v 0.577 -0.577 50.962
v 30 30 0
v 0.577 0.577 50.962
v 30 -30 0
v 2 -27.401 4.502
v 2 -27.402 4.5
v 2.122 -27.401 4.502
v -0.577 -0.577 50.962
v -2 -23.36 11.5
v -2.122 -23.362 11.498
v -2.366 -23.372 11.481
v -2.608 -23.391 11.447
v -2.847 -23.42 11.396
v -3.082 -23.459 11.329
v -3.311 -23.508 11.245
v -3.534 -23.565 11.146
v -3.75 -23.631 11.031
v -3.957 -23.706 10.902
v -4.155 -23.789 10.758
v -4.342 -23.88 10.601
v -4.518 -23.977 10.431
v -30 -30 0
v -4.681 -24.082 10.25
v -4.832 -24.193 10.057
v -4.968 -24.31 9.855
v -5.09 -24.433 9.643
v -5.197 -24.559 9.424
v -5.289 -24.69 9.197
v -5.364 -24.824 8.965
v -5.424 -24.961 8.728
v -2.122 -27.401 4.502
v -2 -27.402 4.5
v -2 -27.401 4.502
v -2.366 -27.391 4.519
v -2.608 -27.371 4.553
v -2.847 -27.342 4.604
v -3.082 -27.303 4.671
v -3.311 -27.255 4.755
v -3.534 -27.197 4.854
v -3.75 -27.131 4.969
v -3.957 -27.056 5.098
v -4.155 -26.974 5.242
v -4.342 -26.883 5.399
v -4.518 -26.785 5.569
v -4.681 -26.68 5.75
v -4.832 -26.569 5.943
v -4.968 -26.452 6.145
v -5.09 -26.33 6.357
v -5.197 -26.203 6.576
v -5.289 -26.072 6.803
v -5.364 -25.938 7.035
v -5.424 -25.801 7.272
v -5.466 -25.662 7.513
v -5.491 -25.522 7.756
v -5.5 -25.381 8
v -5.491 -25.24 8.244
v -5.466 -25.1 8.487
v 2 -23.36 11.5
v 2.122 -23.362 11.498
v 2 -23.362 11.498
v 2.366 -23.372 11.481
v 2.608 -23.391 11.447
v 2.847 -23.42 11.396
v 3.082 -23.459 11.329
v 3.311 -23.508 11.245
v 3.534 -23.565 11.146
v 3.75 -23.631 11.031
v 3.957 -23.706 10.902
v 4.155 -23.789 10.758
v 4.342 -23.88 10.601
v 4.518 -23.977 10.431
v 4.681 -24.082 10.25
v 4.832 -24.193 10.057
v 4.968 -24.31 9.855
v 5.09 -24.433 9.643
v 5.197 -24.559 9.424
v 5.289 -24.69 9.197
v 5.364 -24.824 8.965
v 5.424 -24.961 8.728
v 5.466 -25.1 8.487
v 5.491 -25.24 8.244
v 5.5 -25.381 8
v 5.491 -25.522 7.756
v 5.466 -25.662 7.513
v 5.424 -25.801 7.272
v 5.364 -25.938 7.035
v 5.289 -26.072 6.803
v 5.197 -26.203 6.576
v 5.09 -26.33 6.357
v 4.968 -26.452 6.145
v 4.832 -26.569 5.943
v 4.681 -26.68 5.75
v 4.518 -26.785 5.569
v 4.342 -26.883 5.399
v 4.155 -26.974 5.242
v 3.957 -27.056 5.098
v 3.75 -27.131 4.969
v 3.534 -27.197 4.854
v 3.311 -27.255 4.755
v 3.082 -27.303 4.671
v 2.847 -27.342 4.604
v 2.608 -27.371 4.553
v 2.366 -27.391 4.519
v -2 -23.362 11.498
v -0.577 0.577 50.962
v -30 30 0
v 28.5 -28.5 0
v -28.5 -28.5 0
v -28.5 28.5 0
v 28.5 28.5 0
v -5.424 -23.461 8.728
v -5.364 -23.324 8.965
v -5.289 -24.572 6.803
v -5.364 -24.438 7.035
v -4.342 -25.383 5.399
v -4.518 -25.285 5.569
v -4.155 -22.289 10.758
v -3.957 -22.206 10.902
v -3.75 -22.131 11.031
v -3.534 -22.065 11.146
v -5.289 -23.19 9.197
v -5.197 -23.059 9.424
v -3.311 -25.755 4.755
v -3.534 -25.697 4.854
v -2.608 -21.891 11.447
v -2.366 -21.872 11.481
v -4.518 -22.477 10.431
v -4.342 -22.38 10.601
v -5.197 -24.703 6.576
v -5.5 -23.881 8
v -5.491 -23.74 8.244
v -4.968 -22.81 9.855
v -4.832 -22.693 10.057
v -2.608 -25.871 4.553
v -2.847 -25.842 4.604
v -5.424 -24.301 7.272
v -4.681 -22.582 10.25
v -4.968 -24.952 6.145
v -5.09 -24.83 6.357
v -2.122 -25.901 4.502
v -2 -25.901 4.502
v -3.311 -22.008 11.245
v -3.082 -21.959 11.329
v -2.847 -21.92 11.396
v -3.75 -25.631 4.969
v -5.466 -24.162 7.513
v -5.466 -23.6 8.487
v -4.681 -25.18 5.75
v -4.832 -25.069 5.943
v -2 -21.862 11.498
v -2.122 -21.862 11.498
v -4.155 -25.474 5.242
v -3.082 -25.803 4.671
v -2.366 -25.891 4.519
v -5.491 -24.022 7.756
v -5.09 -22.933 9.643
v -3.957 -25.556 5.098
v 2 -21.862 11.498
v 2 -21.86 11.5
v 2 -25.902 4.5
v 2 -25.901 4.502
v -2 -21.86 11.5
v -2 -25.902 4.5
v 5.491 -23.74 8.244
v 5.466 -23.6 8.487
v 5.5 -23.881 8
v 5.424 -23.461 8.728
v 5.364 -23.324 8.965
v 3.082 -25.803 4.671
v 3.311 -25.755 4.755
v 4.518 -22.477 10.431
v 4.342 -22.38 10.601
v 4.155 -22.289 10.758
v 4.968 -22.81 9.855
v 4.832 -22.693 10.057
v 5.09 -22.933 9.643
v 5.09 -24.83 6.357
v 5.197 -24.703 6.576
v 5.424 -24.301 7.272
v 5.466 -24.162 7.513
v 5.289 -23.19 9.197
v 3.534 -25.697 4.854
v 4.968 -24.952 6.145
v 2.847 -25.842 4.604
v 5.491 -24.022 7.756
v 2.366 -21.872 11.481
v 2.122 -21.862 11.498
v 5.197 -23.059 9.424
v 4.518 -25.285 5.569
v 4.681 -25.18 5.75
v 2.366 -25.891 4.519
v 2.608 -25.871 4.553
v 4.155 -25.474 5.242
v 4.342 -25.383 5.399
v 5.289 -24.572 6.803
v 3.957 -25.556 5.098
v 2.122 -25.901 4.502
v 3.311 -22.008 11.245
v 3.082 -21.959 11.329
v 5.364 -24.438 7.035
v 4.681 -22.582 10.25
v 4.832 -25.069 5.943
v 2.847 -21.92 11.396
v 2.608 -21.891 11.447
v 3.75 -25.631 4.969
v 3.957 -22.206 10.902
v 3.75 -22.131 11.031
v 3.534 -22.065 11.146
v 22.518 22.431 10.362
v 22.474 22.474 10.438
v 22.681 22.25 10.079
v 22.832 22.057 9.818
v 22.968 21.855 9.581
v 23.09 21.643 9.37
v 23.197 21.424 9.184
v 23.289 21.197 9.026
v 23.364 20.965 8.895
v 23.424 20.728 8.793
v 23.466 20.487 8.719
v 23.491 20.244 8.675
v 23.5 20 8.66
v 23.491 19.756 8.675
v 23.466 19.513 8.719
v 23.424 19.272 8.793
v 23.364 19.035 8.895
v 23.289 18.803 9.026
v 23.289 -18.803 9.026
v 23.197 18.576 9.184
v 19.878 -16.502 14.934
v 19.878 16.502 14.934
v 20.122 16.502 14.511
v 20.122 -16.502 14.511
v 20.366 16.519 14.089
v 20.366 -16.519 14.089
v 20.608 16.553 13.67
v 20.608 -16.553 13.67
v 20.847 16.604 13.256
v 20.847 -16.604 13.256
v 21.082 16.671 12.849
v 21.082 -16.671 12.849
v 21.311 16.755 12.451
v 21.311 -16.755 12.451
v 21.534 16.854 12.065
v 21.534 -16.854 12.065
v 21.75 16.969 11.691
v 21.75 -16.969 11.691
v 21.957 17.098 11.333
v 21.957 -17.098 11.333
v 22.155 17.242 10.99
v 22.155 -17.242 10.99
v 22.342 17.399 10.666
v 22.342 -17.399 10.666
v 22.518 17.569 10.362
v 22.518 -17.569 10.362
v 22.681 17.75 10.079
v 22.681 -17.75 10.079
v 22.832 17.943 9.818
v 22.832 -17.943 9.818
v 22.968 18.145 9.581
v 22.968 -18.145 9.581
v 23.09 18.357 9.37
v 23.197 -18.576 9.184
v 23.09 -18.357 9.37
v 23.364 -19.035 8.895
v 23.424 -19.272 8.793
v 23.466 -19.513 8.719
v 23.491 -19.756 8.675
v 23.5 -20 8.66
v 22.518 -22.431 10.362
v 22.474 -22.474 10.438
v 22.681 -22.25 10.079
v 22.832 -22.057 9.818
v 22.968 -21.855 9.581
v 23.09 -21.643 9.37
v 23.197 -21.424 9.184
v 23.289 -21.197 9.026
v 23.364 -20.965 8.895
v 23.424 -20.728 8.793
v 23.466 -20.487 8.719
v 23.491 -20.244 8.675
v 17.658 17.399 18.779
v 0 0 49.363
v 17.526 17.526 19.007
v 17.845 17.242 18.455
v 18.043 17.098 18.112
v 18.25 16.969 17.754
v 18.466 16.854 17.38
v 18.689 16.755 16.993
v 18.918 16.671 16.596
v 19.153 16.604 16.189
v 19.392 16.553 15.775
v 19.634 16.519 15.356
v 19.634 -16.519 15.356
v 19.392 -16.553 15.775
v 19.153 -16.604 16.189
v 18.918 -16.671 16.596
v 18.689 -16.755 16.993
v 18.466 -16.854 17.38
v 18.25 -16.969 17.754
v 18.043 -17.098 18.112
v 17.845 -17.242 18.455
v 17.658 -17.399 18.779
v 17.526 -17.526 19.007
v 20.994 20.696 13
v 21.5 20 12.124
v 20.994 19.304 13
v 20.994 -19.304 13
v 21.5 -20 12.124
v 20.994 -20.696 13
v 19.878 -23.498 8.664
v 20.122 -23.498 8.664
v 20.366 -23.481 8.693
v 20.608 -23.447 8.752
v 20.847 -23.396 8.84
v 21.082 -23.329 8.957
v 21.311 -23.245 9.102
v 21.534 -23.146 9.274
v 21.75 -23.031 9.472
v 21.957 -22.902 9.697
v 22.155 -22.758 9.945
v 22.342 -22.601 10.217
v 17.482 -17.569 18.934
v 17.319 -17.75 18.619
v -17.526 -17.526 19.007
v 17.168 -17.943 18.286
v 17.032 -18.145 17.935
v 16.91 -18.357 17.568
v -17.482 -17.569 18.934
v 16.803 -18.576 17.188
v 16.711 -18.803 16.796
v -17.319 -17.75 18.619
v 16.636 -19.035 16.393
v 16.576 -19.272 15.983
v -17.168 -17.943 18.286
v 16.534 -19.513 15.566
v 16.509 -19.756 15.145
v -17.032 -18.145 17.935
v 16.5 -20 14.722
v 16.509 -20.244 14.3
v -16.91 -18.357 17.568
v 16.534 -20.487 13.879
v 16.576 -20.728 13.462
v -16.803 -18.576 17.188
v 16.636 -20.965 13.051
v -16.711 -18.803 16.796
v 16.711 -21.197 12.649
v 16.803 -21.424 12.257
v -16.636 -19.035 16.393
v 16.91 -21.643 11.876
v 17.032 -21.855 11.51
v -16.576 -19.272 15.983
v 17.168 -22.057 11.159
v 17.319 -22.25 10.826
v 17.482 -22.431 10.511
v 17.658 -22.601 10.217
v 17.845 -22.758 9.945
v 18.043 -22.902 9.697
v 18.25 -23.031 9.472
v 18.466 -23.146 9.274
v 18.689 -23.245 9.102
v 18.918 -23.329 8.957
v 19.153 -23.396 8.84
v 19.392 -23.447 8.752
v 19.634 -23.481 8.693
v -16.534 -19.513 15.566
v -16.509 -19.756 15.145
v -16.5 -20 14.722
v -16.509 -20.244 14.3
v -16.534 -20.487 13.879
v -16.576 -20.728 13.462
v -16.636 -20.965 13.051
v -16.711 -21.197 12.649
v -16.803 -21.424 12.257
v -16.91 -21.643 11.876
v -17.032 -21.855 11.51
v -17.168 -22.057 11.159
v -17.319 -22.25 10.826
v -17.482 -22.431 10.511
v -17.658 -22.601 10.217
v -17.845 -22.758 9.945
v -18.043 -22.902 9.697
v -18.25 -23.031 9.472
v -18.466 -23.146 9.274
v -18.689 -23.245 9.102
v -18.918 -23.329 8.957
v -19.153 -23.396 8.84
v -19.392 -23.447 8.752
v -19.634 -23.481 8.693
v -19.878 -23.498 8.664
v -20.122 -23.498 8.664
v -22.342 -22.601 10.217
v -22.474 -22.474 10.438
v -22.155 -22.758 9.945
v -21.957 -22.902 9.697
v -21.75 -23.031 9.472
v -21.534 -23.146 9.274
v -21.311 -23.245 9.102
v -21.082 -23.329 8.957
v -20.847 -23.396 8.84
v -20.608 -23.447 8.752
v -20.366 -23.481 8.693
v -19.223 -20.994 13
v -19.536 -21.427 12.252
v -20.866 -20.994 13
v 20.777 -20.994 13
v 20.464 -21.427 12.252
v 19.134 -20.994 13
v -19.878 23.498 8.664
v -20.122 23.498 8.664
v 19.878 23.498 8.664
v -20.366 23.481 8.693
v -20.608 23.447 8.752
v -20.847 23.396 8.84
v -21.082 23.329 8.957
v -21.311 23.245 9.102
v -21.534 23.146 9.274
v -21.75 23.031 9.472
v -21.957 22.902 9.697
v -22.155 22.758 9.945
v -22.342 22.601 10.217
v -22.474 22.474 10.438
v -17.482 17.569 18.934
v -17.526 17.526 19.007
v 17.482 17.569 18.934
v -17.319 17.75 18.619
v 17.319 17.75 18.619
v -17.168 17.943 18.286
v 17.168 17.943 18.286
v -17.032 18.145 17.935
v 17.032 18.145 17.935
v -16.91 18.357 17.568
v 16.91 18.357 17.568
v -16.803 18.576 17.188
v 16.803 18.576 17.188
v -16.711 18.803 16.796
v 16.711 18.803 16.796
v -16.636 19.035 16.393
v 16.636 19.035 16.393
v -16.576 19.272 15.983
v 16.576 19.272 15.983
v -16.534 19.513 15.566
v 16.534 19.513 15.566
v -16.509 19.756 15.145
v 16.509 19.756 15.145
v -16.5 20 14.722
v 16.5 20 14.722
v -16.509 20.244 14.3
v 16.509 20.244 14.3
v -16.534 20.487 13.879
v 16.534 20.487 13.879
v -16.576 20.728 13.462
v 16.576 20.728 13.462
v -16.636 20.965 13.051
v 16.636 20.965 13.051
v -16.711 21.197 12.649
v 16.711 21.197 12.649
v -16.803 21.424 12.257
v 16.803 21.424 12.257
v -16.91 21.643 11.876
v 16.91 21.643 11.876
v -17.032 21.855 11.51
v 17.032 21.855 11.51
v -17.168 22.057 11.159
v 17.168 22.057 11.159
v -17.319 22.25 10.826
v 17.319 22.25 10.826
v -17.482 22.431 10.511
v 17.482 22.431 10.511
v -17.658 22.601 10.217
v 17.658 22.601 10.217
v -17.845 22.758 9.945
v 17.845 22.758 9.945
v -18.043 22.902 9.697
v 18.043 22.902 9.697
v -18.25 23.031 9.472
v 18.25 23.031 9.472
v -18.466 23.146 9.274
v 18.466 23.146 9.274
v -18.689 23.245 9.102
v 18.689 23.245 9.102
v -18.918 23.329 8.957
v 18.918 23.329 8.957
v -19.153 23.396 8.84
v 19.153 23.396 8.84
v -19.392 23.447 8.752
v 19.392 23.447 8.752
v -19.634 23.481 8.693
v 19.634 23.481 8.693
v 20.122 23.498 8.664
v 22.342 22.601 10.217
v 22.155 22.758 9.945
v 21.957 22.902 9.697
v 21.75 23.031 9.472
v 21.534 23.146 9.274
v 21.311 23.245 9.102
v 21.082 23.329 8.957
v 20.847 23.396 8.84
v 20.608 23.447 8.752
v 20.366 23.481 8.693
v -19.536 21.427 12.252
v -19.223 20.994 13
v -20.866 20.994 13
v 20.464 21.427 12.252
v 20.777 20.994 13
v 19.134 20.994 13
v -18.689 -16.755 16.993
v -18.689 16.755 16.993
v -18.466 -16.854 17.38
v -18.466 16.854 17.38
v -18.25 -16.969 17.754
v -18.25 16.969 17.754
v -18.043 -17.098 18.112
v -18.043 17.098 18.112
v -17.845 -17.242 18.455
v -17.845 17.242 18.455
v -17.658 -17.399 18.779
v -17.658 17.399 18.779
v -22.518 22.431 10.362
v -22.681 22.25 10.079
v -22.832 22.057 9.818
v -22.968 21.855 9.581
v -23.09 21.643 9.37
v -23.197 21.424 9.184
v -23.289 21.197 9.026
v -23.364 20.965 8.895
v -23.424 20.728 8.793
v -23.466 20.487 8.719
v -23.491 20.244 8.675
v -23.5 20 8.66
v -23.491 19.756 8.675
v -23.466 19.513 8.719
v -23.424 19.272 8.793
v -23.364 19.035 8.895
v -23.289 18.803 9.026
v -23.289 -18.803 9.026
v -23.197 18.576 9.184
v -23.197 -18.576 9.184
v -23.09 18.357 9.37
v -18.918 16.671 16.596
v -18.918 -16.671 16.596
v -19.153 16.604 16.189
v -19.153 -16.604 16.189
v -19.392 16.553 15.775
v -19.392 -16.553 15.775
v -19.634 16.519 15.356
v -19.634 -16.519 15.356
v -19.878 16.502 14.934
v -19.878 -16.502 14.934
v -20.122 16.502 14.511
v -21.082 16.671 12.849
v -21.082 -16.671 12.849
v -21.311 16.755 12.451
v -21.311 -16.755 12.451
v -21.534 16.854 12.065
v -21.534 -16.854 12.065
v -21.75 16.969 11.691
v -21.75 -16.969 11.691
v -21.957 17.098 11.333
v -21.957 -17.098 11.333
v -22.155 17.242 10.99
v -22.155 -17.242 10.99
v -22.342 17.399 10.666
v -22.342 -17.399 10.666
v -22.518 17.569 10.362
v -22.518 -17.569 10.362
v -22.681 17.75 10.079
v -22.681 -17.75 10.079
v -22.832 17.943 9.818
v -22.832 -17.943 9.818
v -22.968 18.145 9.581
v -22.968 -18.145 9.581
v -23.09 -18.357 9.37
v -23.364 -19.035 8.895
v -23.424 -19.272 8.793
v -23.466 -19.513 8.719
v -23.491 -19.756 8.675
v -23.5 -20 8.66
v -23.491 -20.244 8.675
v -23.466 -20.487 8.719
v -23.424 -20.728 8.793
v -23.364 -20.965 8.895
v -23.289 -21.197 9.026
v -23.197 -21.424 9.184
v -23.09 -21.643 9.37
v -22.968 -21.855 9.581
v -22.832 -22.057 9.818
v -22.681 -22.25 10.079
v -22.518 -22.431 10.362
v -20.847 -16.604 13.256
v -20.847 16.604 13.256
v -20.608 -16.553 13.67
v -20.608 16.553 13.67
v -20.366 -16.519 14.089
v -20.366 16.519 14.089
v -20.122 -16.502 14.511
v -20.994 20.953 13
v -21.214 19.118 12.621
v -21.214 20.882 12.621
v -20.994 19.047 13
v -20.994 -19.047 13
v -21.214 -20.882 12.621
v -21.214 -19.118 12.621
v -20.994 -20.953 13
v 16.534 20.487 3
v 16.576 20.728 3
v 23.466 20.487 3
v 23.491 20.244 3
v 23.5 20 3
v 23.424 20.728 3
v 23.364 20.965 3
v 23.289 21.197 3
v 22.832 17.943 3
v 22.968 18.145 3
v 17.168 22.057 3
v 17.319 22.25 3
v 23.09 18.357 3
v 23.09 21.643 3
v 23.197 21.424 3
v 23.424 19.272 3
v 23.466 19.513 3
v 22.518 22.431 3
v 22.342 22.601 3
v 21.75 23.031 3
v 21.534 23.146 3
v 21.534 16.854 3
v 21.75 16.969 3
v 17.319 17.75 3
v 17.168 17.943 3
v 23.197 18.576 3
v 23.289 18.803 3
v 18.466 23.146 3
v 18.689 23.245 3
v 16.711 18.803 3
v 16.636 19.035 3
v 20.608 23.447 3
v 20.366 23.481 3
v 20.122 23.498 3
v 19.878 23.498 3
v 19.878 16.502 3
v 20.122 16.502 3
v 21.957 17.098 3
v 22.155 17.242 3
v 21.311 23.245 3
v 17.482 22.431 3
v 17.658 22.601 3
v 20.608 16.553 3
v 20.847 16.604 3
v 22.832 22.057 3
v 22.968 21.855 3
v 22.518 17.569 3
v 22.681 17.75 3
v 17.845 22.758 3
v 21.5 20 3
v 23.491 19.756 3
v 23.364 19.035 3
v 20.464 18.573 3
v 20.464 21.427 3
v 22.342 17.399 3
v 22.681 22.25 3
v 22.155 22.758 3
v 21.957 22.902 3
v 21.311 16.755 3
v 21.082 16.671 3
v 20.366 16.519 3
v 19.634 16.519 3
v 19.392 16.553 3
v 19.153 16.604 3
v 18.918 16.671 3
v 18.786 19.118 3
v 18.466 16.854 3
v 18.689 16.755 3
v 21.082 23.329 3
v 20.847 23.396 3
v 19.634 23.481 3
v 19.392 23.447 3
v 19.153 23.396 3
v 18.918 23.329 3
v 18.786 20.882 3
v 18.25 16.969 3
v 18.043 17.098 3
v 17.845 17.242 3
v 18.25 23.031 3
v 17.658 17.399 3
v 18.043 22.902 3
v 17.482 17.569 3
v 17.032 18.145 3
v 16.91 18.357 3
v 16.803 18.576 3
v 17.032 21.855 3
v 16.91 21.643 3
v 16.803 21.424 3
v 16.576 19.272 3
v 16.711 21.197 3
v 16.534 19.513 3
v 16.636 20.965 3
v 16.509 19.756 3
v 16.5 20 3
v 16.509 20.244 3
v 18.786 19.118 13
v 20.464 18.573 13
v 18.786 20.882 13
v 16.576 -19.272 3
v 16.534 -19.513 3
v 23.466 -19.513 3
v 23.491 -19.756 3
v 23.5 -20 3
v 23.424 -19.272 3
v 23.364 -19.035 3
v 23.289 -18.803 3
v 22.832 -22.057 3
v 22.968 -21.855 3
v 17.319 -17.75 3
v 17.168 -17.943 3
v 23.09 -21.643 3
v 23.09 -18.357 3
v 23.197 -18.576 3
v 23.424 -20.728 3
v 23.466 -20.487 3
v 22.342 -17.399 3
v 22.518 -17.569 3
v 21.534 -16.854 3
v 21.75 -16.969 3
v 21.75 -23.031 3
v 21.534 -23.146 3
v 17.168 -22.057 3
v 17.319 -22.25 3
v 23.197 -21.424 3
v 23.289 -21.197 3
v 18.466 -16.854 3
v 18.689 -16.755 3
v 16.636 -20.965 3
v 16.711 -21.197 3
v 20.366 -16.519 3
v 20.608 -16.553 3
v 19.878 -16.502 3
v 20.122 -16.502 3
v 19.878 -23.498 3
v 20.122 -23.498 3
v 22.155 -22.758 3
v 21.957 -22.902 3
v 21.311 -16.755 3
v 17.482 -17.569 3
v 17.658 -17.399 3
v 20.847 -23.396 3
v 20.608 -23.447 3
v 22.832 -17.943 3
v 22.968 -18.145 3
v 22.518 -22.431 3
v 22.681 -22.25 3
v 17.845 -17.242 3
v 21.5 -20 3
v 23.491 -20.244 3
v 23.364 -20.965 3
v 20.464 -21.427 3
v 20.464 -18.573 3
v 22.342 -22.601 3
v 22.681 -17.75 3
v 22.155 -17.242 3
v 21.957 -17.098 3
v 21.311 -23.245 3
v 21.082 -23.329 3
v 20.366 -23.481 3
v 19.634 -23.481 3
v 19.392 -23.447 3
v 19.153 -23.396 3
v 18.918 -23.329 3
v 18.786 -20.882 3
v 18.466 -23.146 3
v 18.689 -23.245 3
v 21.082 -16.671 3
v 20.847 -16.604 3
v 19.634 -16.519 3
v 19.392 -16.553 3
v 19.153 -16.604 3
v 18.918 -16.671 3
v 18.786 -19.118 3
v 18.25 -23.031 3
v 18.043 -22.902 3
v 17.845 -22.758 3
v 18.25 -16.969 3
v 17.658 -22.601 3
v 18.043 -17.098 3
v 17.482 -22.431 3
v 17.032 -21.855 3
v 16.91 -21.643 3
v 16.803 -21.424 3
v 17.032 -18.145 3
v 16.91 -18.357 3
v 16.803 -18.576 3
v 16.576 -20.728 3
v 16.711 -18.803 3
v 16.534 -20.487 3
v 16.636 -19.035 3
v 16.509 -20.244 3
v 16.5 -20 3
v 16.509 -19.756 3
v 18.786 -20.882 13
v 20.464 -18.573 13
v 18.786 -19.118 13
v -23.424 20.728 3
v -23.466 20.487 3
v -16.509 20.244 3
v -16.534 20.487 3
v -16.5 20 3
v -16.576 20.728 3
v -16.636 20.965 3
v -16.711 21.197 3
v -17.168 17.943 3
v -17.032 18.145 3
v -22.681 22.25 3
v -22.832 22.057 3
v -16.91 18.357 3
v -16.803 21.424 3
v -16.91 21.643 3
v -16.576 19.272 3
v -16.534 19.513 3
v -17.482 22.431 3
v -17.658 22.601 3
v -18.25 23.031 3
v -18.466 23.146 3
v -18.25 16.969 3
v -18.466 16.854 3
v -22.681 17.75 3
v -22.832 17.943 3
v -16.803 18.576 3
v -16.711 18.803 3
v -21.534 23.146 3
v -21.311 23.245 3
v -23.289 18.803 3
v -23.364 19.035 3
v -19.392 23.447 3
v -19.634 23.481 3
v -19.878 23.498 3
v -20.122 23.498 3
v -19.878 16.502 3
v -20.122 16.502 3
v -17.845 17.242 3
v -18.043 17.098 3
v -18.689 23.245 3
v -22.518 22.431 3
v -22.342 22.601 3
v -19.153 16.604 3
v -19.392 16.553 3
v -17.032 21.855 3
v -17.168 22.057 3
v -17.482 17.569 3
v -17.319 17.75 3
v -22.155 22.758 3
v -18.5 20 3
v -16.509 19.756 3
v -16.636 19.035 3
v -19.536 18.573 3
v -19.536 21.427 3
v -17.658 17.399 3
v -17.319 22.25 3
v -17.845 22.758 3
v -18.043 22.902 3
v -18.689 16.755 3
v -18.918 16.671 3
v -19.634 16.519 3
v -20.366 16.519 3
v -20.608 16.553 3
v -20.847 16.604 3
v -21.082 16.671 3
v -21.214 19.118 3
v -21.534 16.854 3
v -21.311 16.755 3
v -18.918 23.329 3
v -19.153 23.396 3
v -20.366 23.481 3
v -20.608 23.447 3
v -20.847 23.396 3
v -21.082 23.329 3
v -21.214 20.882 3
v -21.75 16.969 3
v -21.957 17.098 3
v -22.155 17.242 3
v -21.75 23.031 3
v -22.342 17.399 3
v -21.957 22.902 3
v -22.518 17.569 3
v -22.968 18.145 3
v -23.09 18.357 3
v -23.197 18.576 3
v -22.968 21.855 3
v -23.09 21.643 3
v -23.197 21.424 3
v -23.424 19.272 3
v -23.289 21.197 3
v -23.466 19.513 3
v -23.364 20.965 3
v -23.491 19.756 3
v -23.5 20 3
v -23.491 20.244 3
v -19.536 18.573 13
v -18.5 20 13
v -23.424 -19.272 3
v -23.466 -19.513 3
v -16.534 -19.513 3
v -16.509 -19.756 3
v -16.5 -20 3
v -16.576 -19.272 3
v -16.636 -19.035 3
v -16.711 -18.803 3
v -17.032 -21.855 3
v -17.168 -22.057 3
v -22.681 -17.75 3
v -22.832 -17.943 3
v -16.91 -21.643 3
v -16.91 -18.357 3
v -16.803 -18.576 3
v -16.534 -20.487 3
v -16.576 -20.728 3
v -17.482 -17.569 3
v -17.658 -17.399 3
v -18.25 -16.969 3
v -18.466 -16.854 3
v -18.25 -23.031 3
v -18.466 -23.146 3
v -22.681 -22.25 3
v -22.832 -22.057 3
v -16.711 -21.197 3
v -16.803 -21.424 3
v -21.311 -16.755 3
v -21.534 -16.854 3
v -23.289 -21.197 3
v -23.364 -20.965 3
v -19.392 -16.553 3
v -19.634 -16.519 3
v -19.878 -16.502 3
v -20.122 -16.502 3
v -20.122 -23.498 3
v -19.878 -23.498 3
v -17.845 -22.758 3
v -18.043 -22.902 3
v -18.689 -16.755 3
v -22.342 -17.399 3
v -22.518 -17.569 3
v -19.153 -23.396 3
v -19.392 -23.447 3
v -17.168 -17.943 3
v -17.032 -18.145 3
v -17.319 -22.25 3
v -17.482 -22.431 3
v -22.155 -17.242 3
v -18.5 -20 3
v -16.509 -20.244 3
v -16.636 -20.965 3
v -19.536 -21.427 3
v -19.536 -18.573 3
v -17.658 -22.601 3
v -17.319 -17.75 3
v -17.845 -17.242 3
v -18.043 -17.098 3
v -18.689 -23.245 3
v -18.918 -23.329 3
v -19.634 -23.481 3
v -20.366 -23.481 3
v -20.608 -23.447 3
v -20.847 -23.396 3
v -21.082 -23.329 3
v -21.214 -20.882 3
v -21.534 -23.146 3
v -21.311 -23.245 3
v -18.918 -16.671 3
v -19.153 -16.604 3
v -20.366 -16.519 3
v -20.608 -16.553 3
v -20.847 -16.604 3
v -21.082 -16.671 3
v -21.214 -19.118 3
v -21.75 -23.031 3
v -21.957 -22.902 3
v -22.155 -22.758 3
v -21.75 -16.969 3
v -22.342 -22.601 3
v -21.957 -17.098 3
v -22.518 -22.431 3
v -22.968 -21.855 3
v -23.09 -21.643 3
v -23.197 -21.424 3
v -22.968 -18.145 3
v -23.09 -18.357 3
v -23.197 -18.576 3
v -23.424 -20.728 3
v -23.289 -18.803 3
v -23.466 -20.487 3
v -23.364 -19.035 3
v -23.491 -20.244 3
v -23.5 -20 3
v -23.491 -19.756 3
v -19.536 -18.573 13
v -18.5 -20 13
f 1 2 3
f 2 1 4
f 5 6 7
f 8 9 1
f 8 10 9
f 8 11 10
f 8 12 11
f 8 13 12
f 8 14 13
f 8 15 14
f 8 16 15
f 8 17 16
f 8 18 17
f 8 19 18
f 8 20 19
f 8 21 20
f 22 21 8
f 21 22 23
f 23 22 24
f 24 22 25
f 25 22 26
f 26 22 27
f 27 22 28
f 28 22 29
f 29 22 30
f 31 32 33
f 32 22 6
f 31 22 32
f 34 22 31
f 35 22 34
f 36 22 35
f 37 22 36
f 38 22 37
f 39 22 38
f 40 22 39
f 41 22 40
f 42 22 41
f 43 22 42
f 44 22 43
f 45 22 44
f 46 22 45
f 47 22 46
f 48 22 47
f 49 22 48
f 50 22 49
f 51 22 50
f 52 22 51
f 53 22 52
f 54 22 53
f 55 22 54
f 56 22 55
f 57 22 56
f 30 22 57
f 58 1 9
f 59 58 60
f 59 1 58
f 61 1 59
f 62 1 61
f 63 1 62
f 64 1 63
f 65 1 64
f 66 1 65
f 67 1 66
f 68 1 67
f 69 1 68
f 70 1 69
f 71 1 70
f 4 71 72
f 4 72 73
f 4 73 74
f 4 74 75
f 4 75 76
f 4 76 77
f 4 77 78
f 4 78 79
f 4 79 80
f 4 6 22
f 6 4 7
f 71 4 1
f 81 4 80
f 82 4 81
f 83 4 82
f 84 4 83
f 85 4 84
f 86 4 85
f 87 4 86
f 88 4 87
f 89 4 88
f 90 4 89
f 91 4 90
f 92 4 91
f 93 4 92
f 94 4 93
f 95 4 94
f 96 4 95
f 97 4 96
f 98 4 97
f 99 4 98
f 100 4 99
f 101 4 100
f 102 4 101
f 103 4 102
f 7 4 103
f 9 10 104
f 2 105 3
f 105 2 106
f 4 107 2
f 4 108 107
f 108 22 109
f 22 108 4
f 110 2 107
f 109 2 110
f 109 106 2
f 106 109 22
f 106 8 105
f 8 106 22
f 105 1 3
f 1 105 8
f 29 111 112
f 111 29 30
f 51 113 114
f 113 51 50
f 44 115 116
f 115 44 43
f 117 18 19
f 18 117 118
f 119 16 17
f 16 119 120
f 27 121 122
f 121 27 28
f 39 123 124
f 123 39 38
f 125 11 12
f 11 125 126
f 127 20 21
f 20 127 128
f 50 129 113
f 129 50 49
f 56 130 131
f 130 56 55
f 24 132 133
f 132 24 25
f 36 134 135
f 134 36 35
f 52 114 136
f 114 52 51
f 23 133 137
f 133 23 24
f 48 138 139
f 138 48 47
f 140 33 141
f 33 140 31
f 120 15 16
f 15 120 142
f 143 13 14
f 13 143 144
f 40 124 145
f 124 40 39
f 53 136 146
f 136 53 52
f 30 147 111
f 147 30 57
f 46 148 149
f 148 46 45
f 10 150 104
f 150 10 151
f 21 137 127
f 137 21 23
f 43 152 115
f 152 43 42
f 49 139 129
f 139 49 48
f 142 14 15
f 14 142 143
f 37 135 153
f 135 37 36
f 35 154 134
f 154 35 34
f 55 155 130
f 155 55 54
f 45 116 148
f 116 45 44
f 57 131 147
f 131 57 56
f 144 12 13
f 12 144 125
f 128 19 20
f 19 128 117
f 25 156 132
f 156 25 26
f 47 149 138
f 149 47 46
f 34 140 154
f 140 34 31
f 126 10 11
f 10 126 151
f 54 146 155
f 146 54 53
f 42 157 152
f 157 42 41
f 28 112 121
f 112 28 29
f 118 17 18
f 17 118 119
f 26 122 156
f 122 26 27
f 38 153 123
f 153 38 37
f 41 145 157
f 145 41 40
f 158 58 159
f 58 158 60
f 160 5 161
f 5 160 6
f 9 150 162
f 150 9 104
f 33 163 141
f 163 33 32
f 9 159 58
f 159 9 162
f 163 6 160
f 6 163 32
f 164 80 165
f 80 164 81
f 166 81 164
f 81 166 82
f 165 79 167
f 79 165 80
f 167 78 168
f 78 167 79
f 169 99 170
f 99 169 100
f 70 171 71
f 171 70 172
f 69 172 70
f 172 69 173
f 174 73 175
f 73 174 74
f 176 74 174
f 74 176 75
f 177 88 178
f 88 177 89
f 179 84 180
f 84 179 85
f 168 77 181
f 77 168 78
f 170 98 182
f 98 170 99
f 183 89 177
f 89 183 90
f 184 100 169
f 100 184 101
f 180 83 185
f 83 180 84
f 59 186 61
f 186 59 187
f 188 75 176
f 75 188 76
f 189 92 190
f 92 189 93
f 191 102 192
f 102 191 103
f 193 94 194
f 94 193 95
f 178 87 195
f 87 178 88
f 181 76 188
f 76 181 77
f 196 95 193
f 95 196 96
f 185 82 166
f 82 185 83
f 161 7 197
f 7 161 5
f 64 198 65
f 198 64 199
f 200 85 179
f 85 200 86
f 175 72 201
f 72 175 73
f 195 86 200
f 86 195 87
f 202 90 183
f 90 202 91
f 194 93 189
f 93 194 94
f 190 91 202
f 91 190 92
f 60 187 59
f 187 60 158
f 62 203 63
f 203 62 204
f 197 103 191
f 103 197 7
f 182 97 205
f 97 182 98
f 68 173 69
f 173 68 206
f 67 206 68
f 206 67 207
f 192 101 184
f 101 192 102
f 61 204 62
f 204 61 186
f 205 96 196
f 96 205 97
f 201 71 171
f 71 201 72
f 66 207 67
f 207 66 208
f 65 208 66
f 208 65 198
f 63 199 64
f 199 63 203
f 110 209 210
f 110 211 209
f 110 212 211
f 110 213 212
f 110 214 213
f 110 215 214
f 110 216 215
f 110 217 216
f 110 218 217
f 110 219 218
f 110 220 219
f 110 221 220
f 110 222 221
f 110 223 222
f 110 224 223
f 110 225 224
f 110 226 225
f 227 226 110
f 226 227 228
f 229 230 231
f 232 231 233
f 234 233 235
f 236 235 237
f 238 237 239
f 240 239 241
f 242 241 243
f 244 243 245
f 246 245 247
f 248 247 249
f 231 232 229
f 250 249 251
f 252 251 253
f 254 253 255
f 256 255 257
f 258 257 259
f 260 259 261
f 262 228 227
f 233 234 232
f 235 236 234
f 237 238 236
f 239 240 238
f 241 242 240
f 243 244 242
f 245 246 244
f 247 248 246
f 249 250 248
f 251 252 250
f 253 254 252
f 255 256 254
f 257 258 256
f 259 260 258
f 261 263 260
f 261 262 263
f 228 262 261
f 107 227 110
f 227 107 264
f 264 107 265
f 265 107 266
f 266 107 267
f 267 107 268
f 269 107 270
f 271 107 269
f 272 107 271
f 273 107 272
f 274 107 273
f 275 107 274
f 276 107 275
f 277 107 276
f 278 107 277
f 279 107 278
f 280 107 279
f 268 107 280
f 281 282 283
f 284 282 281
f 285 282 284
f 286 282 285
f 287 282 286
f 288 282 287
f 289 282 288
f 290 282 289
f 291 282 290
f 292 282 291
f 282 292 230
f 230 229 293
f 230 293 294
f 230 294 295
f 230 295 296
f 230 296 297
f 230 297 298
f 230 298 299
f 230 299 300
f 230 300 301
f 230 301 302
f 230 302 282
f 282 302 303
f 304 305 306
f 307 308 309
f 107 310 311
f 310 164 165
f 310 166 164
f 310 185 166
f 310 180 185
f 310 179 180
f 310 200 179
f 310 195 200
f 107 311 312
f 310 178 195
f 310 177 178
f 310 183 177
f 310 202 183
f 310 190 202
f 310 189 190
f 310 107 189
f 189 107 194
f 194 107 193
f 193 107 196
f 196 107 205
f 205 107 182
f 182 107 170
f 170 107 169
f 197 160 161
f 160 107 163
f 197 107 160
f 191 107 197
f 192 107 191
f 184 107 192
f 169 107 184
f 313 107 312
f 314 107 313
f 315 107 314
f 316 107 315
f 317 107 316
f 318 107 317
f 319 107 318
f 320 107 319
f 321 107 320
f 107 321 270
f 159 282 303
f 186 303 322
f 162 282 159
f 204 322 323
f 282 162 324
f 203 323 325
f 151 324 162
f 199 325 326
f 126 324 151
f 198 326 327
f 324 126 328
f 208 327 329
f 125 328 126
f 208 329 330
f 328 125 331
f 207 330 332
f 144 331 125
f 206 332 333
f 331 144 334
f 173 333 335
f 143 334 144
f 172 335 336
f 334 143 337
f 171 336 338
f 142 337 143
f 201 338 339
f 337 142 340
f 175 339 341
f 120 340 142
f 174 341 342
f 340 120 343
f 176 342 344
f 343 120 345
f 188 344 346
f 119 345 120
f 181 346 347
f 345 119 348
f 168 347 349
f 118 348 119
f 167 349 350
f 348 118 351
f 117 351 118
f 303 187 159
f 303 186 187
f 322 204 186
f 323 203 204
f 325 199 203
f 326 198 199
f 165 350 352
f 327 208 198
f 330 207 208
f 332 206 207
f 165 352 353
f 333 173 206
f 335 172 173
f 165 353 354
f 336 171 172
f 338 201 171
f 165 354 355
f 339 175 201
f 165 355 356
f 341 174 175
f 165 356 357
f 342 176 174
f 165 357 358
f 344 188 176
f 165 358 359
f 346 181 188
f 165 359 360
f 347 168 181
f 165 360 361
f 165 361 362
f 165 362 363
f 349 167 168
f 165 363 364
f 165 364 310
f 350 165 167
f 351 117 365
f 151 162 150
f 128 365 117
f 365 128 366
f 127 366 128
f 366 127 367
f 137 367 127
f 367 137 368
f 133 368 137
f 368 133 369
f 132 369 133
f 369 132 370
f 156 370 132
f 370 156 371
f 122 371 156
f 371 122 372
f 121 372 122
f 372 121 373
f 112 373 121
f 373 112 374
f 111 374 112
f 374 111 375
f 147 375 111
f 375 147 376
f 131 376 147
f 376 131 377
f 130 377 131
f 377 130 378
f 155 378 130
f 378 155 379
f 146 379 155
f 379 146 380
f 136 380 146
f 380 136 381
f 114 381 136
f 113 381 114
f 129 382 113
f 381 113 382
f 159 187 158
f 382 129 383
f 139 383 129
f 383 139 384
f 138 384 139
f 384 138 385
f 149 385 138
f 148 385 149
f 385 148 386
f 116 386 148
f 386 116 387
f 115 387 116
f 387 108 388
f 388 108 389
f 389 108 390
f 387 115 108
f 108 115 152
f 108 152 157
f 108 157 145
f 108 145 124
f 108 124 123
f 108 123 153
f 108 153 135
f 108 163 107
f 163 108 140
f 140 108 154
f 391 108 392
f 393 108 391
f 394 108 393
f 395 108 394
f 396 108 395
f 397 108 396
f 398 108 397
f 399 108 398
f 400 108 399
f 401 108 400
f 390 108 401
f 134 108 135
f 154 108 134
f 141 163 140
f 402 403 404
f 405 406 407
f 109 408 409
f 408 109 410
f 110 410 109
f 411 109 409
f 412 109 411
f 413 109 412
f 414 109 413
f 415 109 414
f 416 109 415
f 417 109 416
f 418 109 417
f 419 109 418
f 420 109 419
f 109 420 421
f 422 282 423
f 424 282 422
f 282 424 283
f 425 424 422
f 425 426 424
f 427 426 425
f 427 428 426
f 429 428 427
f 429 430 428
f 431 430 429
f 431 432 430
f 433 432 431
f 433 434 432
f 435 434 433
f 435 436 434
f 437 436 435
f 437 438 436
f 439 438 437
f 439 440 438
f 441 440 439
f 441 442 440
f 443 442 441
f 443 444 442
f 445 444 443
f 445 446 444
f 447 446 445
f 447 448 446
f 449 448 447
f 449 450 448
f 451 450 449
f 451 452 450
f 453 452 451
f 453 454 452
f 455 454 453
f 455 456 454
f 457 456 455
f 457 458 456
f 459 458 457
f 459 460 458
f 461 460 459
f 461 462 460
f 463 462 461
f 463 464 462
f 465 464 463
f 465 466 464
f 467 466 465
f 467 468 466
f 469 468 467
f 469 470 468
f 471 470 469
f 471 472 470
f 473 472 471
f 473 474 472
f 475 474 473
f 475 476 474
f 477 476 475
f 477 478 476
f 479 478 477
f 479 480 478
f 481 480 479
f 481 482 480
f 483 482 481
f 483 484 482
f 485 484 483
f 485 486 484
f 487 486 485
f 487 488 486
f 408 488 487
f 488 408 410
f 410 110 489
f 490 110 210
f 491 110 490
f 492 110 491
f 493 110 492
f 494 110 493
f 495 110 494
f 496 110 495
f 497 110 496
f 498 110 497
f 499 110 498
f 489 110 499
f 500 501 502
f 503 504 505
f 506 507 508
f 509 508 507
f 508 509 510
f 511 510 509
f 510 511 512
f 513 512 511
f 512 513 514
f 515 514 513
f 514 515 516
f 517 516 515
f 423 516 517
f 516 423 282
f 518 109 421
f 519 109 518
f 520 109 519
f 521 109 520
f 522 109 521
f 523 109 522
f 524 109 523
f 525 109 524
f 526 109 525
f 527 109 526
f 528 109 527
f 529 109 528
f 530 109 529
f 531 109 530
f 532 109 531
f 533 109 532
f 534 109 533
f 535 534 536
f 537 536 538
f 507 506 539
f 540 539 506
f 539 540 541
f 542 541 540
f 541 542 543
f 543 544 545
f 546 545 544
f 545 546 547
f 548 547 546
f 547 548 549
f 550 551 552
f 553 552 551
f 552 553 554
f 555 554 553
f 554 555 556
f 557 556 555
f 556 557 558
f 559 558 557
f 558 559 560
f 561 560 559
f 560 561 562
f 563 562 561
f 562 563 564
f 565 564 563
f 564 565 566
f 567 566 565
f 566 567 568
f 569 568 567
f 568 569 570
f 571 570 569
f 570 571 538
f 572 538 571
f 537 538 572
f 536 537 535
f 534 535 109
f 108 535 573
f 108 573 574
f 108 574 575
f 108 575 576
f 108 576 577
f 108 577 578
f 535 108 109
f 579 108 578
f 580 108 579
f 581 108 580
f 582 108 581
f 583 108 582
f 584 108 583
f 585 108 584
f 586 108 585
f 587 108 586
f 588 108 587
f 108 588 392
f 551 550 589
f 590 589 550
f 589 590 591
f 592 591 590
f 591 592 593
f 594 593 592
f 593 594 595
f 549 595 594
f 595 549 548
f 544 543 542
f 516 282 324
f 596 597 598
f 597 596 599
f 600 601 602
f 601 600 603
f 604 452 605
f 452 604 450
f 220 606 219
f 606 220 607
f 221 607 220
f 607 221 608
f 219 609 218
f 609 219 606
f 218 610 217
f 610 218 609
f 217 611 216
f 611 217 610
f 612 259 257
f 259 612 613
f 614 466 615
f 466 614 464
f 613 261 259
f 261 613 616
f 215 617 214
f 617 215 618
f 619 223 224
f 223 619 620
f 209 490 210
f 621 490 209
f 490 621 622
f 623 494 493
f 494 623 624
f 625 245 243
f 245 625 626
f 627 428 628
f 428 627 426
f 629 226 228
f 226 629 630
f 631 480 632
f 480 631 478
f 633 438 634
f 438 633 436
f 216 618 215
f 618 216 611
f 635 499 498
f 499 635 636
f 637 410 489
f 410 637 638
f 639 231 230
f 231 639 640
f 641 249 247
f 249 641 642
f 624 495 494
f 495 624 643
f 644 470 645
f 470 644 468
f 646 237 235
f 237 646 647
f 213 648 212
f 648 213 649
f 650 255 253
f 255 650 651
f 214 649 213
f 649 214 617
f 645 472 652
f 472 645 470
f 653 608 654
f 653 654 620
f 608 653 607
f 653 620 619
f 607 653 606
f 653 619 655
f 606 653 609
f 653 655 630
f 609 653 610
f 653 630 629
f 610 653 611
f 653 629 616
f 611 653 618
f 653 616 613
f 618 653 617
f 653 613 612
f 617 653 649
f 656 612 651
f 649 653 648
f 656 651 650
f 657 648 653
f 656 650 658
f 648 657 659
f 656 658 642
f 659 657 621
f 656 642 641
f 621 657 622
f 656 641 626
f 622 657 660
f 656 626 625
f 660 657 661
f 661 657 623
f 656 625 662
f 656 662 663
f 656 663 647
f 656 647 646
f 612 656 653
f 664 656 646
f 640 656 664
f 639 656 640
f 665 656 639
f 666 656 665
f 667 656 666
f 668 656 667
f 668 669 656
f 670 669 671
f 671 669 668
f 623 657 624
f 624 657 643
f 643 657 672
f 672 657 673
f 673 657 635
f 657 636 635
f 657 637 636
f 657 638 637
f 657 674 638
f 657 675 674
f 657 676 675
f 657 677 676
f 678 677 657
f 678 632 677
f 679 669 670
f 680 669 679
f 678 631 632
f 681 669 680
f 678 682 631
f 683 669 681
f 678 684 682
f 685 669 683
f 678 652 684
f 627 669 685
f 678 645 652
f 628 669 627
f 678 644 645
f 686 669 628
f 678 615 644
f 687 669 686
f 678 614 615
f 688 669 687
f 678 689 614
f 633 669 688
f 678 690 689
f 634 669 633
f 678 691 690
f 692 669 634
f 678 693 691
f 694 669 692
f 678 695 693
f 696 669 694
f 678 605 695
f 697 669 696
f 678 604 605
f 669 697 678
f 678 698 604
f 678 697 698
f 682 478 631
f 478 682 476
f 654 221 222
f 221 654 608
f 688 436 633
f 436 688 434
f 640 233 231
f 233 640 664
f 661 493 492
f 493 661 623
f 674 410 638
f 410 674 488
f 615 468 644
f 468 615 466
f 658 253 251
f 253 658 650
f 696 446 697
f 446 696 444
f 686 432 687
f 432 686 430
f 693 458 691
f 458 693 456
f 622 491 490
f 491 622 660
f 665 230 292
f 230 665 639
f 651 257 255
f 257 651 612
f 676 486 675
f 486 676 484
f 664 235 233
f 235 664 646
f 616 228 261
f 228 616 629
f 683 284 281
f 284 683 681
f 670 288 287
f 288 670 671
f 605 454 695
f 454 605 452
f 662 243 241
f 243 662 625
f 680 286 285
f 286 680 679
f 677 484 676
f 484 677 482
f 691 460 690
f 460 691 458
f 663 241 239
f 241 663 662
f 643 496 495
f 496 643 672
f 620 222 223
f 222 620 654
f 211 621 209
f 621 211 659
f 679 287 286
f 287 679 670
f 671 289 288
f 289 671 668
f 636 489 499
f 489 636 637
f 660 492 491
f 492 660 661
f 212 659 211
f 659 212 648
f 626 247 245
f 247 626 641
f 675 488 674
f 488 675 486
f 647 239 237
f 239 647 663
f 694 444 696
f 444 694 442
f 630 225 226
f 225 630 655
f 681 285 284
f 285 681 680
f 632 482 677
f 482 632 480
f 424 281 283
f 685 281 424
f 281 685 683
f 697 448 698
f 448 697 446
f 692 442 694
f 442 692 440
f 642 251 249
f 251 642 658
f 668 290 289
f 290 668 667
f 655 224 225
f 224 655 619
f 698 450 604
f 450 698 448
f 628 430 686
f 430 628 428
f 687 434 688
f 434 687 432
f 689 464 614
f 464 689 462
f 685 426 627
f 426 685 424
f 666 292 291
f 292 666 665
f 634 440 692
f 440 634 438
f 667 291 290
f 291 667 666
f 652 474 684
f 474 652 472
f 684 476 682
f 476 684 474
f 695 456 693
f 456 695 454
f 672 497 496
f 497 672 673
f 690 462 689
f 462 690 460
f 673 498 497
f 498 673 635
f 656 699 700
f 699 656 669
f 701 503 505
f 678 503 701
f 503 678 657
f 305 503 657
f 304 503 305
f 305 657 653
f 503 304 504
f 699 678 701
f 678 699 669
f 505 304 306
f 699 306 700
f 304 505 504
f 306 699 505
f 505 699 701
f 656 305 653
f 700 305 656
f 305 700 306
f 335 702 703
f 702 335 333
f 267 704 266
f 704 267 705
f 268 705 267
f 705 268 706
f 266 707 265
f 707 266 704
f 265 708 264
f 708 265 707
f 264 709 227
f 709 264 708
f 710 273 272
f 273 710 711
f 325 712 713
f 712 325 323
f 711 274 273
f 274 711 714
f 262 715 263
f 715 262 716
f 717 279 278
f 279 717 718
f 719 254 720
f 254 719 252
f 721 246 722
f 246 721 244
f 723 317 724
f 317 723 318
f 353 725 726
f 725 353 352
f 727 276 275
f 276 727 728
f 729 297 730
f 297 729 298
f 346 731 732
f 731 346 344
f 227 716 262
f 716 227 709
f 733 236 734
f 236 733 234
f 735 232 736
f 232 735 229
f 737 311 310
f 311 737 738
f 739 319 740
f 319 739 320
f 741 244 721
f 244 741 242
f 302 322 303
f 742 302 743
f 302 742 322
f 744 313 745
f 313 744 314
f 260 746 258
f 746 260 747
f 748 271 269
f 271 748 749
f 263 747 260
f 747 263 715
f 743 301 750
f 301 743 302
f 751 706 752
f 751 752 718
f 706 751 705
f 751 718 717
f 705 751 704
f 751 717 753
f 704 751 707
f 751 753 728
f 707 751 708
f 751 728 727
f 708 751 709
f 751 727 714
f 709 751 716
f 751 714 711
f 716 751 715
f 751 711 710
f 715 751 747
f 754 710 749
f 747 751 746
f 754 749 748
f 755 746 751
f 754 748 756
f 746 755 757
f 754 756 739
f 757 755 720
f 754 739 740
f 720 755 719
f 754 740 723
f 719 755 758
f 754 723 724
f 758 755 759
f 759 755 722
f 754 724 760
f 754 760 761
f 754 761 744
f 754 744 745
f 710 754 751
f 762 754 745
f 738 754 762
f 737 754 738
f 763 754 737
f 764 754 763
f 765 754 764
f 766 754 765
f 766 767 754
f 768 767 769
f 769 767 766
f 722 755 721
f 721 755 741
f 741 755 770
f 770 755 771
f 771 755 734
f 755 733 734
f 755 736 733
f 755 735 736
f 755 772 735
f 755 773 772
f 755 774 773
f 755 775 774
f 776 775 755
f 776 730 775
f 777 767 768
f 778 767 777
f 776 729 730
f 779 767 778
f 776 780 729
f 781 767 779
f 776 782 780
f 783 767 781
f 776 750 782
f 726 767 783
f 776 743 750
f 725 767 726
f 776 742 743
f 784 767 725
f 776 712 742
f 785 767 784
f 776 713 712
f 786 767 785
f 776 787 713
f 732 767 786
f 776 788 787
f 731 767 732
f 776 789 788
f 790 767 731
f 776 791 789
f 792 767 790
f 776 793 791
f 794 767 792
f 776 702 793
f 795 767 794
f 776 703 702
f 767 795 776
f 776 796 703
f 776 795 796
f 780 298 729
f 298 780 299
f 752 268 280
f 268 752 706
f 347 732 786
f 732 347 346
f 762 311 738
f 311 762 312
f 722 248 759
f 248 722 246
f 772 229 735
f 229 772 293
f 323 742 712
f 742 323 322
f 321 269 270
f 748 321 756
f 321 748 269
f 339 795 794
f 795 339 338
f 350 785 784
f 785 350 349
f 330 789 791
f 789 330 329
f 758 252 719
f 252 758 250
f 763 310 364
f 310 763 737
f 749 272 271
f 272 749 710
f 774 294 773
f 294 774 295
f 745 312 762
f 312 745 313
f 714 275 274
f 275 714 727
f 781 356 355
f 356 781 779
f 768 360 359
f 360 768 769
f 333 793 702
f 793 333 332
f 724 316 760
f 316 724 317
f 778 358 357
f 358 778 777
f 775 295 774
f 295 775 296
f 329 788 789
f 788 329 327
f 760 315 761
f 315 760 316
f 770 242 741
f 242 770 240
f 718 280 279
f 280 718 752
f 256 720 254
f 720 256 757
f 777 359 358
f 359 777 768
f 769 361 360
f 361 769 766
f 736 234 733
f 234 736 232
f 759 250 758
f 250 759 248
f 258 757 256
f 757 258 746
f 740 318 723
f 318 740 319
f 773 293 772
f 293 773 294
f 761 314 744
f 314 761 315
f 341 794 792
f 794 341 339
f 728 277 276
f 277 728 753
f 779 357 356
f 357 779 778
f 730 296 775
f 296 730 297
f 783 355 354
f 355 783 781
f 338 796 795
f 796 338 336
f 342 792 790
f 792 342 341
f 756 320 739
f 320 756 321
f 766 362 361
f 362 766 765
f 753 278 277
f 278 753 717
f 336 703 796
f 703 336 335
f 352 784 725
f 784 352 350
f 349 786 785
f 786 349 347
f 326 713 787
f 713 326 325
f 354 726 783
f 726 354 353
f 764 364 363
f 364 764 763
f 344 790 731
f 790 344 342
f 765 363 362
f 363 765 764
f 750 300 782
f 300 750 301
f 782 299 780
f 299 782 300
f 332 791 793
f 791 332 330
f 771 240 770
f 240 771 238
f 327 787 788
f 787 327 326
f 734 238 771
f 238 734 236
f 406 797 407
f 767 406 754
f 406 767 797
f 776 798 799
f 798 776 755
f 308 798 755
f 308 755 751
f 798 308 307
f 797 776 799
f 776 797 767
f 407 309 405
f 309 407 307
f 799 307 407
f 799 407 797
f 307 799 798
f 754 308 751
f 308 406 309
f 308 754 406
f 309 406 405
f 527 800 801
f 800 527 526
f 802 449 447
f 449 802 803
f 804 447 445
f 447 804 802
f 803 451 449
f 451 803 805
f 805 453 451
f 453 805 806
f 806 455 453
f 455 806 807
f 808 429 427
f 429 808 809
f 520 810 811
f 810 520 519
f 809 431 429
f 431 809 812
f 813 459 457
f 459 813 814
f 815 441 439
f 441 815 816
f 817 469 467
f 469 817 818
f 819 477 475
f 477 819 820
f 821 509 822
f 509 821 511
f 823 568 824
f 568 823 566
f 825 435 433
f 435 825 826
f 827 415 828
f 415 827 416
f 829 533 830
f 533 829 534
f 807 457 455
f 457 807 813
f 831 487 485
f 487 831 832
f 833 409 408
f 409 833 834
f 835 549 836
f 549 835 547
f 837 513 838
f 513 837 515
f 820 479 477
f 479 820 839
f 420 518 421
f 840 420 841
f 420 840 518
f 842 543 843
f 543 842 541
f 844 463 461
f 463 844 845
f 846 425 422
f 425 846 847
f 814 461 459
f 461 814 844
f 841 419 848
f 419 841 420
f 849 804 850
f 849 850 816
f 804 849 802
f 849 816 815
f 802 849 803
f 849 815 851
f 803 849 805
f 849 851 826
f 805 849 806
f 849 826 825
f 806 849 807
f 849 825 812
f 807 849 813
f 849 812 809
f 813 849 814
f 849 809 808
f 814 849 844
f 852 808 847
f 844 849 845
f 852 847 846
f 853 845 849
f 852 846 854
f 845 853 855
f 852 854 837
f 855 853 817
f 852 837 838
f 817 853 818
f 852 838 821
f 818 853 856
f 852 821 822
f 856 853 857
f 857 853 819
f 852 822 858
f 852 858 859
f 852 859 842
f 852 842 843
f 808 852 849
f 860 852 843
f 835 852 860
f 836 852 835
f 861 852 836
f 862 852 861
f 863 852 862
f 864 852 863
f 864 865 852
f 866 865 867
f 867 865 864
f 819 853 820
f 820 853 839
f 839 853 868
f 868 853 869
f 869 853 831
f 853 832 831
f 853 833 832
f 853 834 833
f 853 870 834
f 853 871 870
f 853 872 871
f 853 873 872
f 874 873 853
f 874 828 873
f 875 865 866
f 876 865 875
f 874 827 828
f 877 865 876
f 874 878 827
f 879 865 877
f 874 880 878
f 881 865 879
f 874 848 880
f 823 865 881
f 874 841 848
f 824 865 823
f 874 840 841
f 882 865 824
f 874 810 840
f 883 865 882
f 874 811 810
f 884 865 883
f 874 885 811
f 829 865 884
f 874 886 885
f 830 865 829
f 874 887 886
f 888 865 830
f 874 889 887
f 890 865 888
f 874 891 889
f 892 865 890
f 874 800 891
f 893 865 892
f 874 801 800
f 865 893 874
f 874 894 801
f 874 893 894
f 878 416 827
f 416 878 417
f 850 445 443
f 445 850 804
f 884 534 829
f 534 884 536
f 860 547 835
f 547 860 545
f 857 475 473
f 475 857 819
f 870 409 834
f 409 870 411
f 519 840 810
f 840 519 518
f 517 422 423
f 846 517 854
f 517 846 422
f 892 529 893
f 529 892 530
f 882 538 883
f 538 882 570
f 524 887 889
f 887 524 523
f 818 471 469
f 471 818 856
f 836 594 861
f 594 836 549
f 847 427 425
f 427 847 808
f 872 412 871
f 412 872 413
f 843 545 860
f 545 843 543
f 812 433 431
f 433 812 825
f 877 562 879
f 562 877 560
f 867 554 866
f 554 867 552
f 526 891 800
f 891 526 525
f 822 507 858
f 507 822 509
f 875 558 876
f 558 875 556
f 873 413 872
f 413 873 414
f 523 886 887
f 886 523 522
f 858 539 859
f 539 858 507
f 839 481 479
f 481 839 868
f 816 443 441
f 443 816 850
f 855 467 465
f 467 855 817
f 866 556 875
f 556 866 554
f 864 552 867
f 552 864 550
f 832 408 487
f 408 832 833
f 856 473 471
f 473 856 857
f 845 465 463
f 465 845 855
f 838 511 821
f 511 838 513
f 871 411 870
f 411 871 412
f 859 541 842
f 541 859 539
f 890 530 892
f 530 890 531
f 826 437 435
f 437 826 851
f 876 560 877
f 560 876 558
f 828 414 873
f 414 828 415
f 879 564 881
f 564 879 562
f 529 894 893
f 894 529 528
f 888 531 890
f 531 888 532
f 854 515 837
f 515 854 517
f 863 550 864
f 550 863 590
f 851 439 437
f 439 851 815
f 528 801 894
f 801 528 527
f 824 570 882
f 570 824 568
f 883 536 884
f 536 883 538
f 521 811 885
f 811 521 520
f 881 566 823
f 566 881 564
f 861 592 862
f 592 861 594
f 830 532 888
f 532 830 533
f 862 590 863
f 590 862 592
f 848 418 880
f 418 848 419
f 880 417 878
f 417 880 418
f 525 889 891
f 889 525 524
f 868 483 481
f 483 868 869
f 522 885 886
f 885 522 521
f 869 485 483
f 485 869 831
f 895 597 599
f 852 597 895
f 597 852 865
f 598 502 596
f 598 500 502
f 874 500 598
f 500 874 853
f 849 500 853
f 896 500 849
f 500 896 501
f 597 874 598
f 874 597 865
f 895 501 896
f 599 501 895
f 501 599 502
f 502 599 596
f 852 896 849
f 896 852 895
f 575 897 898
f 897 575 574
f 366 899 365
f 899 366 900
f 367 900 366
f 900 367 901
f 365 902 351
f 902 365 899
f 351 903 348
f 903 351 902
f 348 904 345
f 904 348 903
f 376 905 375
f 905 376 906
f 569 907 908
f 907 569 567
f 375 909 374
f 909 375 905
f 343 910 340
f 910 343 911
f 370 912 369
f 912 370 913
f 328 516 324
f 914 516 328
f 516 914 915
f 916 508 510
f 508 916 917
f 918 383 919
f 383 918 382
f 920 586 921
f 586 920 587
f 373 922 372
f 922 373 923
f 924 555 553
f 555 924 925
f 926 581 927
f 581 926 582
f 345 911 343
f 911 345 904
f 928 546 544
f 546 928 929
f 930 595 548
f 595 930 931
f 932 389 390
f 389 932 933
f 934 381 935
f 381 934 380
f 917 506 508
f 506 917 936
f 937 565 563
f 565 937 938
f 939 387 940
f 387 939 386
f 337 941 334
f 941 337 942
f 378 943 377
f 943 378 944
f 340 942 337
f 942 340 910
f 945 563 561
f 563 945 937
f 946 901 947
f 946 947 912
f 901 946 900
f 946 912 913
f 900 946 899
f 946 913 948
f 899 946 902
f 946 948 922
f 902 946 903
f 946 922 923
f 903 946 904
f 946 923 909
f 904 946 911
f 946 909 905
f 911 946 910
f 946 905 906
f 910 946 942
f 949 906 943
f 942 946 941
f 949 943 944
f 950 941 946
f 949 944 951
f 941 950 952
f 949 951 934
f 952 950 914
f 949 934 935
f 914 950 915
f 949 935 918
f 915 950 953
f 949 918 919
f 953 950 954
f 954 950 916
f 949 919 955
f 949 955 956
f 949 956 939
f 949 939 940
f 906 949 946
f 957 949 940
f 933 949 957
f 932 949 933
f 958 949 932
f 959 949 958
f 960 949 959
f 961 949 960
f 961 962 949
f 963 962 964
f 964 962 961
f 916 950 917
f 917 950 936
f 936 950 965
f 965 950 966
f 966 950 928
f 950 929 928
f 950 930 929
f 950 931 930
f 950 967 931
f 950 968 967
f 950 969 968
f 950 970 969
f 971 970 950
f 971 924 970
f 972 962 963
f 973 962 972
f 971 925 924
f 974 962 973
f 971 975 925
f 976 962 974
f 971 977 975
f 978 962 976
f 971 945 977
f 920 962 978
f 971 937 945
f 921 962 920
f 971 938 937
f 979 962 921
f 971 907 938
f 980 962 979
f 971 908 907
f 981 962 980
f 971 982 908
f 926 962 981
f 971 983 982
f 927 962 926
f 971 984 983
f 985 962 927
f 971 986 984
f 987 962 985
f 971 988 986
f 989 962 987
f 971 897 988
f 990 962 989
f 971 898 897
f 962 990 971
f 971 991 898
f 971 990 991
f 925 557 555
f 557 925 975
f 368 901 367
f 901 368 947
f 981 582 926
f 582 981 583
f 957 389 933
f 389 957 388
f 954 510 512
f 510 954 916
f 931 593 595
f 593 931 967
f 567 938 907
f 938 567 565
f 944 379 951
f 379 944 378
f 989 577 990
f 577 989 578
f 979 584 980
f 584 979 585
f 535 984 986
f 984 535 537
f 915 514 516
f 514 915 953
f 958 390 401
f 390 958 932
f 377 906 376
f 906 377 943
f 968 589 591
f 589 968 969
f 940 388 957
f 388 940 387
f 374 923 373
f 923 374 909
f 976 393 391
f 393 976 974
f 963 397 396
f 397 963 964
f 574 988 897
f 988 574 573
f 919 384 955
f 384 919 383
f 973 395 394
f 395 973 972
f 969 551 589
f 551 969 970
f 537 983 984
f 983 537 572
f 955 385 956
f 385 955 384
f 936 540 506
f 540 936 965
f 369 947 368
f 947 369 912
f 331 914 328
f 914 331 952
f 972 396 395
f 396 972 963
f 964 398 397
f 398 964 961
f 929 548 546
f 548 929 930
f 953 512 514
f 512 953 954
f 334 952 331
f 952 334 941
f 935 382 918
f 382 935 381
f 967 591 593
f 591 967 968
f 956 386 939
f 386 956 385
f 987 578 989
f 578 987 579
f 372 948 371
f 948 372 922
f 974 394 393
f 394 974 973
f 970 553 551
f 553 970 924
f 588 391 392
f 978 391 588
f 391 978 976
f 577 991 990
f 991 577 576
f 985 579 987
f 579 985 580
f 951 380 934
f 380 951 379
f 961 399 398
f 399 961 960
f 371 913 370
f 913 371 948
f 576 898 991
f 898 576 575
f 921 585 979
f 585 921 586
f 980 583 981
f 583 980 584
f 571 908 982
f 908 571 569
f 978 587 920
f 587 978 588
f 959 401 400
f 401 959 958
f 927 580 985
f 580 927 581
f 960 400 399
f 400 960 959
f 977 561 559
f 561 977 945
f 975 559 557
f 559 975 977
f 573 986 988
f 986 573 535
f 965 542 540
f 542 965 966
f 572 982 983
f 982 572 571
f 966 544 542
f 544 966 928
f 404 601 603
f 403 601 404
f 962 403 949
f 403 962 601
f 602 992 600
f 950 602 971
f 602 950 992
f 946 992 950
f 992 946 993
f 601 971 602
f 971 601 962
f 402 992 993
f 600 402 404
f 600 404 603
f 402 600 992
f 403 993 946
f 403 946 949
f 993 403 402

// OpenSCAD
/*
 * Kaminari
 *
 * Copyright (C) 2020 Richard "Shred" Körber
 *   https://github.com/shred/kaminari
 *
 * This program is free software: you can redistribute it and/or modify
 * it under the terms of the GNU General Public License as published by
 * the Free Software Foundation, either version 3 of the License, or
 * (at your option) any later version.
 *
 * This program is distributed in the hope that it will be useful,
 * but WITHOUT ANY WARRANTY; without even the implied warranty of
 * MERCHANTABILITY or FITNESS FOR A PARTICULAR PURPOSE.  See the
 * GNU General Public License for more details.
 */

use <kaminari.scad>
upper();
